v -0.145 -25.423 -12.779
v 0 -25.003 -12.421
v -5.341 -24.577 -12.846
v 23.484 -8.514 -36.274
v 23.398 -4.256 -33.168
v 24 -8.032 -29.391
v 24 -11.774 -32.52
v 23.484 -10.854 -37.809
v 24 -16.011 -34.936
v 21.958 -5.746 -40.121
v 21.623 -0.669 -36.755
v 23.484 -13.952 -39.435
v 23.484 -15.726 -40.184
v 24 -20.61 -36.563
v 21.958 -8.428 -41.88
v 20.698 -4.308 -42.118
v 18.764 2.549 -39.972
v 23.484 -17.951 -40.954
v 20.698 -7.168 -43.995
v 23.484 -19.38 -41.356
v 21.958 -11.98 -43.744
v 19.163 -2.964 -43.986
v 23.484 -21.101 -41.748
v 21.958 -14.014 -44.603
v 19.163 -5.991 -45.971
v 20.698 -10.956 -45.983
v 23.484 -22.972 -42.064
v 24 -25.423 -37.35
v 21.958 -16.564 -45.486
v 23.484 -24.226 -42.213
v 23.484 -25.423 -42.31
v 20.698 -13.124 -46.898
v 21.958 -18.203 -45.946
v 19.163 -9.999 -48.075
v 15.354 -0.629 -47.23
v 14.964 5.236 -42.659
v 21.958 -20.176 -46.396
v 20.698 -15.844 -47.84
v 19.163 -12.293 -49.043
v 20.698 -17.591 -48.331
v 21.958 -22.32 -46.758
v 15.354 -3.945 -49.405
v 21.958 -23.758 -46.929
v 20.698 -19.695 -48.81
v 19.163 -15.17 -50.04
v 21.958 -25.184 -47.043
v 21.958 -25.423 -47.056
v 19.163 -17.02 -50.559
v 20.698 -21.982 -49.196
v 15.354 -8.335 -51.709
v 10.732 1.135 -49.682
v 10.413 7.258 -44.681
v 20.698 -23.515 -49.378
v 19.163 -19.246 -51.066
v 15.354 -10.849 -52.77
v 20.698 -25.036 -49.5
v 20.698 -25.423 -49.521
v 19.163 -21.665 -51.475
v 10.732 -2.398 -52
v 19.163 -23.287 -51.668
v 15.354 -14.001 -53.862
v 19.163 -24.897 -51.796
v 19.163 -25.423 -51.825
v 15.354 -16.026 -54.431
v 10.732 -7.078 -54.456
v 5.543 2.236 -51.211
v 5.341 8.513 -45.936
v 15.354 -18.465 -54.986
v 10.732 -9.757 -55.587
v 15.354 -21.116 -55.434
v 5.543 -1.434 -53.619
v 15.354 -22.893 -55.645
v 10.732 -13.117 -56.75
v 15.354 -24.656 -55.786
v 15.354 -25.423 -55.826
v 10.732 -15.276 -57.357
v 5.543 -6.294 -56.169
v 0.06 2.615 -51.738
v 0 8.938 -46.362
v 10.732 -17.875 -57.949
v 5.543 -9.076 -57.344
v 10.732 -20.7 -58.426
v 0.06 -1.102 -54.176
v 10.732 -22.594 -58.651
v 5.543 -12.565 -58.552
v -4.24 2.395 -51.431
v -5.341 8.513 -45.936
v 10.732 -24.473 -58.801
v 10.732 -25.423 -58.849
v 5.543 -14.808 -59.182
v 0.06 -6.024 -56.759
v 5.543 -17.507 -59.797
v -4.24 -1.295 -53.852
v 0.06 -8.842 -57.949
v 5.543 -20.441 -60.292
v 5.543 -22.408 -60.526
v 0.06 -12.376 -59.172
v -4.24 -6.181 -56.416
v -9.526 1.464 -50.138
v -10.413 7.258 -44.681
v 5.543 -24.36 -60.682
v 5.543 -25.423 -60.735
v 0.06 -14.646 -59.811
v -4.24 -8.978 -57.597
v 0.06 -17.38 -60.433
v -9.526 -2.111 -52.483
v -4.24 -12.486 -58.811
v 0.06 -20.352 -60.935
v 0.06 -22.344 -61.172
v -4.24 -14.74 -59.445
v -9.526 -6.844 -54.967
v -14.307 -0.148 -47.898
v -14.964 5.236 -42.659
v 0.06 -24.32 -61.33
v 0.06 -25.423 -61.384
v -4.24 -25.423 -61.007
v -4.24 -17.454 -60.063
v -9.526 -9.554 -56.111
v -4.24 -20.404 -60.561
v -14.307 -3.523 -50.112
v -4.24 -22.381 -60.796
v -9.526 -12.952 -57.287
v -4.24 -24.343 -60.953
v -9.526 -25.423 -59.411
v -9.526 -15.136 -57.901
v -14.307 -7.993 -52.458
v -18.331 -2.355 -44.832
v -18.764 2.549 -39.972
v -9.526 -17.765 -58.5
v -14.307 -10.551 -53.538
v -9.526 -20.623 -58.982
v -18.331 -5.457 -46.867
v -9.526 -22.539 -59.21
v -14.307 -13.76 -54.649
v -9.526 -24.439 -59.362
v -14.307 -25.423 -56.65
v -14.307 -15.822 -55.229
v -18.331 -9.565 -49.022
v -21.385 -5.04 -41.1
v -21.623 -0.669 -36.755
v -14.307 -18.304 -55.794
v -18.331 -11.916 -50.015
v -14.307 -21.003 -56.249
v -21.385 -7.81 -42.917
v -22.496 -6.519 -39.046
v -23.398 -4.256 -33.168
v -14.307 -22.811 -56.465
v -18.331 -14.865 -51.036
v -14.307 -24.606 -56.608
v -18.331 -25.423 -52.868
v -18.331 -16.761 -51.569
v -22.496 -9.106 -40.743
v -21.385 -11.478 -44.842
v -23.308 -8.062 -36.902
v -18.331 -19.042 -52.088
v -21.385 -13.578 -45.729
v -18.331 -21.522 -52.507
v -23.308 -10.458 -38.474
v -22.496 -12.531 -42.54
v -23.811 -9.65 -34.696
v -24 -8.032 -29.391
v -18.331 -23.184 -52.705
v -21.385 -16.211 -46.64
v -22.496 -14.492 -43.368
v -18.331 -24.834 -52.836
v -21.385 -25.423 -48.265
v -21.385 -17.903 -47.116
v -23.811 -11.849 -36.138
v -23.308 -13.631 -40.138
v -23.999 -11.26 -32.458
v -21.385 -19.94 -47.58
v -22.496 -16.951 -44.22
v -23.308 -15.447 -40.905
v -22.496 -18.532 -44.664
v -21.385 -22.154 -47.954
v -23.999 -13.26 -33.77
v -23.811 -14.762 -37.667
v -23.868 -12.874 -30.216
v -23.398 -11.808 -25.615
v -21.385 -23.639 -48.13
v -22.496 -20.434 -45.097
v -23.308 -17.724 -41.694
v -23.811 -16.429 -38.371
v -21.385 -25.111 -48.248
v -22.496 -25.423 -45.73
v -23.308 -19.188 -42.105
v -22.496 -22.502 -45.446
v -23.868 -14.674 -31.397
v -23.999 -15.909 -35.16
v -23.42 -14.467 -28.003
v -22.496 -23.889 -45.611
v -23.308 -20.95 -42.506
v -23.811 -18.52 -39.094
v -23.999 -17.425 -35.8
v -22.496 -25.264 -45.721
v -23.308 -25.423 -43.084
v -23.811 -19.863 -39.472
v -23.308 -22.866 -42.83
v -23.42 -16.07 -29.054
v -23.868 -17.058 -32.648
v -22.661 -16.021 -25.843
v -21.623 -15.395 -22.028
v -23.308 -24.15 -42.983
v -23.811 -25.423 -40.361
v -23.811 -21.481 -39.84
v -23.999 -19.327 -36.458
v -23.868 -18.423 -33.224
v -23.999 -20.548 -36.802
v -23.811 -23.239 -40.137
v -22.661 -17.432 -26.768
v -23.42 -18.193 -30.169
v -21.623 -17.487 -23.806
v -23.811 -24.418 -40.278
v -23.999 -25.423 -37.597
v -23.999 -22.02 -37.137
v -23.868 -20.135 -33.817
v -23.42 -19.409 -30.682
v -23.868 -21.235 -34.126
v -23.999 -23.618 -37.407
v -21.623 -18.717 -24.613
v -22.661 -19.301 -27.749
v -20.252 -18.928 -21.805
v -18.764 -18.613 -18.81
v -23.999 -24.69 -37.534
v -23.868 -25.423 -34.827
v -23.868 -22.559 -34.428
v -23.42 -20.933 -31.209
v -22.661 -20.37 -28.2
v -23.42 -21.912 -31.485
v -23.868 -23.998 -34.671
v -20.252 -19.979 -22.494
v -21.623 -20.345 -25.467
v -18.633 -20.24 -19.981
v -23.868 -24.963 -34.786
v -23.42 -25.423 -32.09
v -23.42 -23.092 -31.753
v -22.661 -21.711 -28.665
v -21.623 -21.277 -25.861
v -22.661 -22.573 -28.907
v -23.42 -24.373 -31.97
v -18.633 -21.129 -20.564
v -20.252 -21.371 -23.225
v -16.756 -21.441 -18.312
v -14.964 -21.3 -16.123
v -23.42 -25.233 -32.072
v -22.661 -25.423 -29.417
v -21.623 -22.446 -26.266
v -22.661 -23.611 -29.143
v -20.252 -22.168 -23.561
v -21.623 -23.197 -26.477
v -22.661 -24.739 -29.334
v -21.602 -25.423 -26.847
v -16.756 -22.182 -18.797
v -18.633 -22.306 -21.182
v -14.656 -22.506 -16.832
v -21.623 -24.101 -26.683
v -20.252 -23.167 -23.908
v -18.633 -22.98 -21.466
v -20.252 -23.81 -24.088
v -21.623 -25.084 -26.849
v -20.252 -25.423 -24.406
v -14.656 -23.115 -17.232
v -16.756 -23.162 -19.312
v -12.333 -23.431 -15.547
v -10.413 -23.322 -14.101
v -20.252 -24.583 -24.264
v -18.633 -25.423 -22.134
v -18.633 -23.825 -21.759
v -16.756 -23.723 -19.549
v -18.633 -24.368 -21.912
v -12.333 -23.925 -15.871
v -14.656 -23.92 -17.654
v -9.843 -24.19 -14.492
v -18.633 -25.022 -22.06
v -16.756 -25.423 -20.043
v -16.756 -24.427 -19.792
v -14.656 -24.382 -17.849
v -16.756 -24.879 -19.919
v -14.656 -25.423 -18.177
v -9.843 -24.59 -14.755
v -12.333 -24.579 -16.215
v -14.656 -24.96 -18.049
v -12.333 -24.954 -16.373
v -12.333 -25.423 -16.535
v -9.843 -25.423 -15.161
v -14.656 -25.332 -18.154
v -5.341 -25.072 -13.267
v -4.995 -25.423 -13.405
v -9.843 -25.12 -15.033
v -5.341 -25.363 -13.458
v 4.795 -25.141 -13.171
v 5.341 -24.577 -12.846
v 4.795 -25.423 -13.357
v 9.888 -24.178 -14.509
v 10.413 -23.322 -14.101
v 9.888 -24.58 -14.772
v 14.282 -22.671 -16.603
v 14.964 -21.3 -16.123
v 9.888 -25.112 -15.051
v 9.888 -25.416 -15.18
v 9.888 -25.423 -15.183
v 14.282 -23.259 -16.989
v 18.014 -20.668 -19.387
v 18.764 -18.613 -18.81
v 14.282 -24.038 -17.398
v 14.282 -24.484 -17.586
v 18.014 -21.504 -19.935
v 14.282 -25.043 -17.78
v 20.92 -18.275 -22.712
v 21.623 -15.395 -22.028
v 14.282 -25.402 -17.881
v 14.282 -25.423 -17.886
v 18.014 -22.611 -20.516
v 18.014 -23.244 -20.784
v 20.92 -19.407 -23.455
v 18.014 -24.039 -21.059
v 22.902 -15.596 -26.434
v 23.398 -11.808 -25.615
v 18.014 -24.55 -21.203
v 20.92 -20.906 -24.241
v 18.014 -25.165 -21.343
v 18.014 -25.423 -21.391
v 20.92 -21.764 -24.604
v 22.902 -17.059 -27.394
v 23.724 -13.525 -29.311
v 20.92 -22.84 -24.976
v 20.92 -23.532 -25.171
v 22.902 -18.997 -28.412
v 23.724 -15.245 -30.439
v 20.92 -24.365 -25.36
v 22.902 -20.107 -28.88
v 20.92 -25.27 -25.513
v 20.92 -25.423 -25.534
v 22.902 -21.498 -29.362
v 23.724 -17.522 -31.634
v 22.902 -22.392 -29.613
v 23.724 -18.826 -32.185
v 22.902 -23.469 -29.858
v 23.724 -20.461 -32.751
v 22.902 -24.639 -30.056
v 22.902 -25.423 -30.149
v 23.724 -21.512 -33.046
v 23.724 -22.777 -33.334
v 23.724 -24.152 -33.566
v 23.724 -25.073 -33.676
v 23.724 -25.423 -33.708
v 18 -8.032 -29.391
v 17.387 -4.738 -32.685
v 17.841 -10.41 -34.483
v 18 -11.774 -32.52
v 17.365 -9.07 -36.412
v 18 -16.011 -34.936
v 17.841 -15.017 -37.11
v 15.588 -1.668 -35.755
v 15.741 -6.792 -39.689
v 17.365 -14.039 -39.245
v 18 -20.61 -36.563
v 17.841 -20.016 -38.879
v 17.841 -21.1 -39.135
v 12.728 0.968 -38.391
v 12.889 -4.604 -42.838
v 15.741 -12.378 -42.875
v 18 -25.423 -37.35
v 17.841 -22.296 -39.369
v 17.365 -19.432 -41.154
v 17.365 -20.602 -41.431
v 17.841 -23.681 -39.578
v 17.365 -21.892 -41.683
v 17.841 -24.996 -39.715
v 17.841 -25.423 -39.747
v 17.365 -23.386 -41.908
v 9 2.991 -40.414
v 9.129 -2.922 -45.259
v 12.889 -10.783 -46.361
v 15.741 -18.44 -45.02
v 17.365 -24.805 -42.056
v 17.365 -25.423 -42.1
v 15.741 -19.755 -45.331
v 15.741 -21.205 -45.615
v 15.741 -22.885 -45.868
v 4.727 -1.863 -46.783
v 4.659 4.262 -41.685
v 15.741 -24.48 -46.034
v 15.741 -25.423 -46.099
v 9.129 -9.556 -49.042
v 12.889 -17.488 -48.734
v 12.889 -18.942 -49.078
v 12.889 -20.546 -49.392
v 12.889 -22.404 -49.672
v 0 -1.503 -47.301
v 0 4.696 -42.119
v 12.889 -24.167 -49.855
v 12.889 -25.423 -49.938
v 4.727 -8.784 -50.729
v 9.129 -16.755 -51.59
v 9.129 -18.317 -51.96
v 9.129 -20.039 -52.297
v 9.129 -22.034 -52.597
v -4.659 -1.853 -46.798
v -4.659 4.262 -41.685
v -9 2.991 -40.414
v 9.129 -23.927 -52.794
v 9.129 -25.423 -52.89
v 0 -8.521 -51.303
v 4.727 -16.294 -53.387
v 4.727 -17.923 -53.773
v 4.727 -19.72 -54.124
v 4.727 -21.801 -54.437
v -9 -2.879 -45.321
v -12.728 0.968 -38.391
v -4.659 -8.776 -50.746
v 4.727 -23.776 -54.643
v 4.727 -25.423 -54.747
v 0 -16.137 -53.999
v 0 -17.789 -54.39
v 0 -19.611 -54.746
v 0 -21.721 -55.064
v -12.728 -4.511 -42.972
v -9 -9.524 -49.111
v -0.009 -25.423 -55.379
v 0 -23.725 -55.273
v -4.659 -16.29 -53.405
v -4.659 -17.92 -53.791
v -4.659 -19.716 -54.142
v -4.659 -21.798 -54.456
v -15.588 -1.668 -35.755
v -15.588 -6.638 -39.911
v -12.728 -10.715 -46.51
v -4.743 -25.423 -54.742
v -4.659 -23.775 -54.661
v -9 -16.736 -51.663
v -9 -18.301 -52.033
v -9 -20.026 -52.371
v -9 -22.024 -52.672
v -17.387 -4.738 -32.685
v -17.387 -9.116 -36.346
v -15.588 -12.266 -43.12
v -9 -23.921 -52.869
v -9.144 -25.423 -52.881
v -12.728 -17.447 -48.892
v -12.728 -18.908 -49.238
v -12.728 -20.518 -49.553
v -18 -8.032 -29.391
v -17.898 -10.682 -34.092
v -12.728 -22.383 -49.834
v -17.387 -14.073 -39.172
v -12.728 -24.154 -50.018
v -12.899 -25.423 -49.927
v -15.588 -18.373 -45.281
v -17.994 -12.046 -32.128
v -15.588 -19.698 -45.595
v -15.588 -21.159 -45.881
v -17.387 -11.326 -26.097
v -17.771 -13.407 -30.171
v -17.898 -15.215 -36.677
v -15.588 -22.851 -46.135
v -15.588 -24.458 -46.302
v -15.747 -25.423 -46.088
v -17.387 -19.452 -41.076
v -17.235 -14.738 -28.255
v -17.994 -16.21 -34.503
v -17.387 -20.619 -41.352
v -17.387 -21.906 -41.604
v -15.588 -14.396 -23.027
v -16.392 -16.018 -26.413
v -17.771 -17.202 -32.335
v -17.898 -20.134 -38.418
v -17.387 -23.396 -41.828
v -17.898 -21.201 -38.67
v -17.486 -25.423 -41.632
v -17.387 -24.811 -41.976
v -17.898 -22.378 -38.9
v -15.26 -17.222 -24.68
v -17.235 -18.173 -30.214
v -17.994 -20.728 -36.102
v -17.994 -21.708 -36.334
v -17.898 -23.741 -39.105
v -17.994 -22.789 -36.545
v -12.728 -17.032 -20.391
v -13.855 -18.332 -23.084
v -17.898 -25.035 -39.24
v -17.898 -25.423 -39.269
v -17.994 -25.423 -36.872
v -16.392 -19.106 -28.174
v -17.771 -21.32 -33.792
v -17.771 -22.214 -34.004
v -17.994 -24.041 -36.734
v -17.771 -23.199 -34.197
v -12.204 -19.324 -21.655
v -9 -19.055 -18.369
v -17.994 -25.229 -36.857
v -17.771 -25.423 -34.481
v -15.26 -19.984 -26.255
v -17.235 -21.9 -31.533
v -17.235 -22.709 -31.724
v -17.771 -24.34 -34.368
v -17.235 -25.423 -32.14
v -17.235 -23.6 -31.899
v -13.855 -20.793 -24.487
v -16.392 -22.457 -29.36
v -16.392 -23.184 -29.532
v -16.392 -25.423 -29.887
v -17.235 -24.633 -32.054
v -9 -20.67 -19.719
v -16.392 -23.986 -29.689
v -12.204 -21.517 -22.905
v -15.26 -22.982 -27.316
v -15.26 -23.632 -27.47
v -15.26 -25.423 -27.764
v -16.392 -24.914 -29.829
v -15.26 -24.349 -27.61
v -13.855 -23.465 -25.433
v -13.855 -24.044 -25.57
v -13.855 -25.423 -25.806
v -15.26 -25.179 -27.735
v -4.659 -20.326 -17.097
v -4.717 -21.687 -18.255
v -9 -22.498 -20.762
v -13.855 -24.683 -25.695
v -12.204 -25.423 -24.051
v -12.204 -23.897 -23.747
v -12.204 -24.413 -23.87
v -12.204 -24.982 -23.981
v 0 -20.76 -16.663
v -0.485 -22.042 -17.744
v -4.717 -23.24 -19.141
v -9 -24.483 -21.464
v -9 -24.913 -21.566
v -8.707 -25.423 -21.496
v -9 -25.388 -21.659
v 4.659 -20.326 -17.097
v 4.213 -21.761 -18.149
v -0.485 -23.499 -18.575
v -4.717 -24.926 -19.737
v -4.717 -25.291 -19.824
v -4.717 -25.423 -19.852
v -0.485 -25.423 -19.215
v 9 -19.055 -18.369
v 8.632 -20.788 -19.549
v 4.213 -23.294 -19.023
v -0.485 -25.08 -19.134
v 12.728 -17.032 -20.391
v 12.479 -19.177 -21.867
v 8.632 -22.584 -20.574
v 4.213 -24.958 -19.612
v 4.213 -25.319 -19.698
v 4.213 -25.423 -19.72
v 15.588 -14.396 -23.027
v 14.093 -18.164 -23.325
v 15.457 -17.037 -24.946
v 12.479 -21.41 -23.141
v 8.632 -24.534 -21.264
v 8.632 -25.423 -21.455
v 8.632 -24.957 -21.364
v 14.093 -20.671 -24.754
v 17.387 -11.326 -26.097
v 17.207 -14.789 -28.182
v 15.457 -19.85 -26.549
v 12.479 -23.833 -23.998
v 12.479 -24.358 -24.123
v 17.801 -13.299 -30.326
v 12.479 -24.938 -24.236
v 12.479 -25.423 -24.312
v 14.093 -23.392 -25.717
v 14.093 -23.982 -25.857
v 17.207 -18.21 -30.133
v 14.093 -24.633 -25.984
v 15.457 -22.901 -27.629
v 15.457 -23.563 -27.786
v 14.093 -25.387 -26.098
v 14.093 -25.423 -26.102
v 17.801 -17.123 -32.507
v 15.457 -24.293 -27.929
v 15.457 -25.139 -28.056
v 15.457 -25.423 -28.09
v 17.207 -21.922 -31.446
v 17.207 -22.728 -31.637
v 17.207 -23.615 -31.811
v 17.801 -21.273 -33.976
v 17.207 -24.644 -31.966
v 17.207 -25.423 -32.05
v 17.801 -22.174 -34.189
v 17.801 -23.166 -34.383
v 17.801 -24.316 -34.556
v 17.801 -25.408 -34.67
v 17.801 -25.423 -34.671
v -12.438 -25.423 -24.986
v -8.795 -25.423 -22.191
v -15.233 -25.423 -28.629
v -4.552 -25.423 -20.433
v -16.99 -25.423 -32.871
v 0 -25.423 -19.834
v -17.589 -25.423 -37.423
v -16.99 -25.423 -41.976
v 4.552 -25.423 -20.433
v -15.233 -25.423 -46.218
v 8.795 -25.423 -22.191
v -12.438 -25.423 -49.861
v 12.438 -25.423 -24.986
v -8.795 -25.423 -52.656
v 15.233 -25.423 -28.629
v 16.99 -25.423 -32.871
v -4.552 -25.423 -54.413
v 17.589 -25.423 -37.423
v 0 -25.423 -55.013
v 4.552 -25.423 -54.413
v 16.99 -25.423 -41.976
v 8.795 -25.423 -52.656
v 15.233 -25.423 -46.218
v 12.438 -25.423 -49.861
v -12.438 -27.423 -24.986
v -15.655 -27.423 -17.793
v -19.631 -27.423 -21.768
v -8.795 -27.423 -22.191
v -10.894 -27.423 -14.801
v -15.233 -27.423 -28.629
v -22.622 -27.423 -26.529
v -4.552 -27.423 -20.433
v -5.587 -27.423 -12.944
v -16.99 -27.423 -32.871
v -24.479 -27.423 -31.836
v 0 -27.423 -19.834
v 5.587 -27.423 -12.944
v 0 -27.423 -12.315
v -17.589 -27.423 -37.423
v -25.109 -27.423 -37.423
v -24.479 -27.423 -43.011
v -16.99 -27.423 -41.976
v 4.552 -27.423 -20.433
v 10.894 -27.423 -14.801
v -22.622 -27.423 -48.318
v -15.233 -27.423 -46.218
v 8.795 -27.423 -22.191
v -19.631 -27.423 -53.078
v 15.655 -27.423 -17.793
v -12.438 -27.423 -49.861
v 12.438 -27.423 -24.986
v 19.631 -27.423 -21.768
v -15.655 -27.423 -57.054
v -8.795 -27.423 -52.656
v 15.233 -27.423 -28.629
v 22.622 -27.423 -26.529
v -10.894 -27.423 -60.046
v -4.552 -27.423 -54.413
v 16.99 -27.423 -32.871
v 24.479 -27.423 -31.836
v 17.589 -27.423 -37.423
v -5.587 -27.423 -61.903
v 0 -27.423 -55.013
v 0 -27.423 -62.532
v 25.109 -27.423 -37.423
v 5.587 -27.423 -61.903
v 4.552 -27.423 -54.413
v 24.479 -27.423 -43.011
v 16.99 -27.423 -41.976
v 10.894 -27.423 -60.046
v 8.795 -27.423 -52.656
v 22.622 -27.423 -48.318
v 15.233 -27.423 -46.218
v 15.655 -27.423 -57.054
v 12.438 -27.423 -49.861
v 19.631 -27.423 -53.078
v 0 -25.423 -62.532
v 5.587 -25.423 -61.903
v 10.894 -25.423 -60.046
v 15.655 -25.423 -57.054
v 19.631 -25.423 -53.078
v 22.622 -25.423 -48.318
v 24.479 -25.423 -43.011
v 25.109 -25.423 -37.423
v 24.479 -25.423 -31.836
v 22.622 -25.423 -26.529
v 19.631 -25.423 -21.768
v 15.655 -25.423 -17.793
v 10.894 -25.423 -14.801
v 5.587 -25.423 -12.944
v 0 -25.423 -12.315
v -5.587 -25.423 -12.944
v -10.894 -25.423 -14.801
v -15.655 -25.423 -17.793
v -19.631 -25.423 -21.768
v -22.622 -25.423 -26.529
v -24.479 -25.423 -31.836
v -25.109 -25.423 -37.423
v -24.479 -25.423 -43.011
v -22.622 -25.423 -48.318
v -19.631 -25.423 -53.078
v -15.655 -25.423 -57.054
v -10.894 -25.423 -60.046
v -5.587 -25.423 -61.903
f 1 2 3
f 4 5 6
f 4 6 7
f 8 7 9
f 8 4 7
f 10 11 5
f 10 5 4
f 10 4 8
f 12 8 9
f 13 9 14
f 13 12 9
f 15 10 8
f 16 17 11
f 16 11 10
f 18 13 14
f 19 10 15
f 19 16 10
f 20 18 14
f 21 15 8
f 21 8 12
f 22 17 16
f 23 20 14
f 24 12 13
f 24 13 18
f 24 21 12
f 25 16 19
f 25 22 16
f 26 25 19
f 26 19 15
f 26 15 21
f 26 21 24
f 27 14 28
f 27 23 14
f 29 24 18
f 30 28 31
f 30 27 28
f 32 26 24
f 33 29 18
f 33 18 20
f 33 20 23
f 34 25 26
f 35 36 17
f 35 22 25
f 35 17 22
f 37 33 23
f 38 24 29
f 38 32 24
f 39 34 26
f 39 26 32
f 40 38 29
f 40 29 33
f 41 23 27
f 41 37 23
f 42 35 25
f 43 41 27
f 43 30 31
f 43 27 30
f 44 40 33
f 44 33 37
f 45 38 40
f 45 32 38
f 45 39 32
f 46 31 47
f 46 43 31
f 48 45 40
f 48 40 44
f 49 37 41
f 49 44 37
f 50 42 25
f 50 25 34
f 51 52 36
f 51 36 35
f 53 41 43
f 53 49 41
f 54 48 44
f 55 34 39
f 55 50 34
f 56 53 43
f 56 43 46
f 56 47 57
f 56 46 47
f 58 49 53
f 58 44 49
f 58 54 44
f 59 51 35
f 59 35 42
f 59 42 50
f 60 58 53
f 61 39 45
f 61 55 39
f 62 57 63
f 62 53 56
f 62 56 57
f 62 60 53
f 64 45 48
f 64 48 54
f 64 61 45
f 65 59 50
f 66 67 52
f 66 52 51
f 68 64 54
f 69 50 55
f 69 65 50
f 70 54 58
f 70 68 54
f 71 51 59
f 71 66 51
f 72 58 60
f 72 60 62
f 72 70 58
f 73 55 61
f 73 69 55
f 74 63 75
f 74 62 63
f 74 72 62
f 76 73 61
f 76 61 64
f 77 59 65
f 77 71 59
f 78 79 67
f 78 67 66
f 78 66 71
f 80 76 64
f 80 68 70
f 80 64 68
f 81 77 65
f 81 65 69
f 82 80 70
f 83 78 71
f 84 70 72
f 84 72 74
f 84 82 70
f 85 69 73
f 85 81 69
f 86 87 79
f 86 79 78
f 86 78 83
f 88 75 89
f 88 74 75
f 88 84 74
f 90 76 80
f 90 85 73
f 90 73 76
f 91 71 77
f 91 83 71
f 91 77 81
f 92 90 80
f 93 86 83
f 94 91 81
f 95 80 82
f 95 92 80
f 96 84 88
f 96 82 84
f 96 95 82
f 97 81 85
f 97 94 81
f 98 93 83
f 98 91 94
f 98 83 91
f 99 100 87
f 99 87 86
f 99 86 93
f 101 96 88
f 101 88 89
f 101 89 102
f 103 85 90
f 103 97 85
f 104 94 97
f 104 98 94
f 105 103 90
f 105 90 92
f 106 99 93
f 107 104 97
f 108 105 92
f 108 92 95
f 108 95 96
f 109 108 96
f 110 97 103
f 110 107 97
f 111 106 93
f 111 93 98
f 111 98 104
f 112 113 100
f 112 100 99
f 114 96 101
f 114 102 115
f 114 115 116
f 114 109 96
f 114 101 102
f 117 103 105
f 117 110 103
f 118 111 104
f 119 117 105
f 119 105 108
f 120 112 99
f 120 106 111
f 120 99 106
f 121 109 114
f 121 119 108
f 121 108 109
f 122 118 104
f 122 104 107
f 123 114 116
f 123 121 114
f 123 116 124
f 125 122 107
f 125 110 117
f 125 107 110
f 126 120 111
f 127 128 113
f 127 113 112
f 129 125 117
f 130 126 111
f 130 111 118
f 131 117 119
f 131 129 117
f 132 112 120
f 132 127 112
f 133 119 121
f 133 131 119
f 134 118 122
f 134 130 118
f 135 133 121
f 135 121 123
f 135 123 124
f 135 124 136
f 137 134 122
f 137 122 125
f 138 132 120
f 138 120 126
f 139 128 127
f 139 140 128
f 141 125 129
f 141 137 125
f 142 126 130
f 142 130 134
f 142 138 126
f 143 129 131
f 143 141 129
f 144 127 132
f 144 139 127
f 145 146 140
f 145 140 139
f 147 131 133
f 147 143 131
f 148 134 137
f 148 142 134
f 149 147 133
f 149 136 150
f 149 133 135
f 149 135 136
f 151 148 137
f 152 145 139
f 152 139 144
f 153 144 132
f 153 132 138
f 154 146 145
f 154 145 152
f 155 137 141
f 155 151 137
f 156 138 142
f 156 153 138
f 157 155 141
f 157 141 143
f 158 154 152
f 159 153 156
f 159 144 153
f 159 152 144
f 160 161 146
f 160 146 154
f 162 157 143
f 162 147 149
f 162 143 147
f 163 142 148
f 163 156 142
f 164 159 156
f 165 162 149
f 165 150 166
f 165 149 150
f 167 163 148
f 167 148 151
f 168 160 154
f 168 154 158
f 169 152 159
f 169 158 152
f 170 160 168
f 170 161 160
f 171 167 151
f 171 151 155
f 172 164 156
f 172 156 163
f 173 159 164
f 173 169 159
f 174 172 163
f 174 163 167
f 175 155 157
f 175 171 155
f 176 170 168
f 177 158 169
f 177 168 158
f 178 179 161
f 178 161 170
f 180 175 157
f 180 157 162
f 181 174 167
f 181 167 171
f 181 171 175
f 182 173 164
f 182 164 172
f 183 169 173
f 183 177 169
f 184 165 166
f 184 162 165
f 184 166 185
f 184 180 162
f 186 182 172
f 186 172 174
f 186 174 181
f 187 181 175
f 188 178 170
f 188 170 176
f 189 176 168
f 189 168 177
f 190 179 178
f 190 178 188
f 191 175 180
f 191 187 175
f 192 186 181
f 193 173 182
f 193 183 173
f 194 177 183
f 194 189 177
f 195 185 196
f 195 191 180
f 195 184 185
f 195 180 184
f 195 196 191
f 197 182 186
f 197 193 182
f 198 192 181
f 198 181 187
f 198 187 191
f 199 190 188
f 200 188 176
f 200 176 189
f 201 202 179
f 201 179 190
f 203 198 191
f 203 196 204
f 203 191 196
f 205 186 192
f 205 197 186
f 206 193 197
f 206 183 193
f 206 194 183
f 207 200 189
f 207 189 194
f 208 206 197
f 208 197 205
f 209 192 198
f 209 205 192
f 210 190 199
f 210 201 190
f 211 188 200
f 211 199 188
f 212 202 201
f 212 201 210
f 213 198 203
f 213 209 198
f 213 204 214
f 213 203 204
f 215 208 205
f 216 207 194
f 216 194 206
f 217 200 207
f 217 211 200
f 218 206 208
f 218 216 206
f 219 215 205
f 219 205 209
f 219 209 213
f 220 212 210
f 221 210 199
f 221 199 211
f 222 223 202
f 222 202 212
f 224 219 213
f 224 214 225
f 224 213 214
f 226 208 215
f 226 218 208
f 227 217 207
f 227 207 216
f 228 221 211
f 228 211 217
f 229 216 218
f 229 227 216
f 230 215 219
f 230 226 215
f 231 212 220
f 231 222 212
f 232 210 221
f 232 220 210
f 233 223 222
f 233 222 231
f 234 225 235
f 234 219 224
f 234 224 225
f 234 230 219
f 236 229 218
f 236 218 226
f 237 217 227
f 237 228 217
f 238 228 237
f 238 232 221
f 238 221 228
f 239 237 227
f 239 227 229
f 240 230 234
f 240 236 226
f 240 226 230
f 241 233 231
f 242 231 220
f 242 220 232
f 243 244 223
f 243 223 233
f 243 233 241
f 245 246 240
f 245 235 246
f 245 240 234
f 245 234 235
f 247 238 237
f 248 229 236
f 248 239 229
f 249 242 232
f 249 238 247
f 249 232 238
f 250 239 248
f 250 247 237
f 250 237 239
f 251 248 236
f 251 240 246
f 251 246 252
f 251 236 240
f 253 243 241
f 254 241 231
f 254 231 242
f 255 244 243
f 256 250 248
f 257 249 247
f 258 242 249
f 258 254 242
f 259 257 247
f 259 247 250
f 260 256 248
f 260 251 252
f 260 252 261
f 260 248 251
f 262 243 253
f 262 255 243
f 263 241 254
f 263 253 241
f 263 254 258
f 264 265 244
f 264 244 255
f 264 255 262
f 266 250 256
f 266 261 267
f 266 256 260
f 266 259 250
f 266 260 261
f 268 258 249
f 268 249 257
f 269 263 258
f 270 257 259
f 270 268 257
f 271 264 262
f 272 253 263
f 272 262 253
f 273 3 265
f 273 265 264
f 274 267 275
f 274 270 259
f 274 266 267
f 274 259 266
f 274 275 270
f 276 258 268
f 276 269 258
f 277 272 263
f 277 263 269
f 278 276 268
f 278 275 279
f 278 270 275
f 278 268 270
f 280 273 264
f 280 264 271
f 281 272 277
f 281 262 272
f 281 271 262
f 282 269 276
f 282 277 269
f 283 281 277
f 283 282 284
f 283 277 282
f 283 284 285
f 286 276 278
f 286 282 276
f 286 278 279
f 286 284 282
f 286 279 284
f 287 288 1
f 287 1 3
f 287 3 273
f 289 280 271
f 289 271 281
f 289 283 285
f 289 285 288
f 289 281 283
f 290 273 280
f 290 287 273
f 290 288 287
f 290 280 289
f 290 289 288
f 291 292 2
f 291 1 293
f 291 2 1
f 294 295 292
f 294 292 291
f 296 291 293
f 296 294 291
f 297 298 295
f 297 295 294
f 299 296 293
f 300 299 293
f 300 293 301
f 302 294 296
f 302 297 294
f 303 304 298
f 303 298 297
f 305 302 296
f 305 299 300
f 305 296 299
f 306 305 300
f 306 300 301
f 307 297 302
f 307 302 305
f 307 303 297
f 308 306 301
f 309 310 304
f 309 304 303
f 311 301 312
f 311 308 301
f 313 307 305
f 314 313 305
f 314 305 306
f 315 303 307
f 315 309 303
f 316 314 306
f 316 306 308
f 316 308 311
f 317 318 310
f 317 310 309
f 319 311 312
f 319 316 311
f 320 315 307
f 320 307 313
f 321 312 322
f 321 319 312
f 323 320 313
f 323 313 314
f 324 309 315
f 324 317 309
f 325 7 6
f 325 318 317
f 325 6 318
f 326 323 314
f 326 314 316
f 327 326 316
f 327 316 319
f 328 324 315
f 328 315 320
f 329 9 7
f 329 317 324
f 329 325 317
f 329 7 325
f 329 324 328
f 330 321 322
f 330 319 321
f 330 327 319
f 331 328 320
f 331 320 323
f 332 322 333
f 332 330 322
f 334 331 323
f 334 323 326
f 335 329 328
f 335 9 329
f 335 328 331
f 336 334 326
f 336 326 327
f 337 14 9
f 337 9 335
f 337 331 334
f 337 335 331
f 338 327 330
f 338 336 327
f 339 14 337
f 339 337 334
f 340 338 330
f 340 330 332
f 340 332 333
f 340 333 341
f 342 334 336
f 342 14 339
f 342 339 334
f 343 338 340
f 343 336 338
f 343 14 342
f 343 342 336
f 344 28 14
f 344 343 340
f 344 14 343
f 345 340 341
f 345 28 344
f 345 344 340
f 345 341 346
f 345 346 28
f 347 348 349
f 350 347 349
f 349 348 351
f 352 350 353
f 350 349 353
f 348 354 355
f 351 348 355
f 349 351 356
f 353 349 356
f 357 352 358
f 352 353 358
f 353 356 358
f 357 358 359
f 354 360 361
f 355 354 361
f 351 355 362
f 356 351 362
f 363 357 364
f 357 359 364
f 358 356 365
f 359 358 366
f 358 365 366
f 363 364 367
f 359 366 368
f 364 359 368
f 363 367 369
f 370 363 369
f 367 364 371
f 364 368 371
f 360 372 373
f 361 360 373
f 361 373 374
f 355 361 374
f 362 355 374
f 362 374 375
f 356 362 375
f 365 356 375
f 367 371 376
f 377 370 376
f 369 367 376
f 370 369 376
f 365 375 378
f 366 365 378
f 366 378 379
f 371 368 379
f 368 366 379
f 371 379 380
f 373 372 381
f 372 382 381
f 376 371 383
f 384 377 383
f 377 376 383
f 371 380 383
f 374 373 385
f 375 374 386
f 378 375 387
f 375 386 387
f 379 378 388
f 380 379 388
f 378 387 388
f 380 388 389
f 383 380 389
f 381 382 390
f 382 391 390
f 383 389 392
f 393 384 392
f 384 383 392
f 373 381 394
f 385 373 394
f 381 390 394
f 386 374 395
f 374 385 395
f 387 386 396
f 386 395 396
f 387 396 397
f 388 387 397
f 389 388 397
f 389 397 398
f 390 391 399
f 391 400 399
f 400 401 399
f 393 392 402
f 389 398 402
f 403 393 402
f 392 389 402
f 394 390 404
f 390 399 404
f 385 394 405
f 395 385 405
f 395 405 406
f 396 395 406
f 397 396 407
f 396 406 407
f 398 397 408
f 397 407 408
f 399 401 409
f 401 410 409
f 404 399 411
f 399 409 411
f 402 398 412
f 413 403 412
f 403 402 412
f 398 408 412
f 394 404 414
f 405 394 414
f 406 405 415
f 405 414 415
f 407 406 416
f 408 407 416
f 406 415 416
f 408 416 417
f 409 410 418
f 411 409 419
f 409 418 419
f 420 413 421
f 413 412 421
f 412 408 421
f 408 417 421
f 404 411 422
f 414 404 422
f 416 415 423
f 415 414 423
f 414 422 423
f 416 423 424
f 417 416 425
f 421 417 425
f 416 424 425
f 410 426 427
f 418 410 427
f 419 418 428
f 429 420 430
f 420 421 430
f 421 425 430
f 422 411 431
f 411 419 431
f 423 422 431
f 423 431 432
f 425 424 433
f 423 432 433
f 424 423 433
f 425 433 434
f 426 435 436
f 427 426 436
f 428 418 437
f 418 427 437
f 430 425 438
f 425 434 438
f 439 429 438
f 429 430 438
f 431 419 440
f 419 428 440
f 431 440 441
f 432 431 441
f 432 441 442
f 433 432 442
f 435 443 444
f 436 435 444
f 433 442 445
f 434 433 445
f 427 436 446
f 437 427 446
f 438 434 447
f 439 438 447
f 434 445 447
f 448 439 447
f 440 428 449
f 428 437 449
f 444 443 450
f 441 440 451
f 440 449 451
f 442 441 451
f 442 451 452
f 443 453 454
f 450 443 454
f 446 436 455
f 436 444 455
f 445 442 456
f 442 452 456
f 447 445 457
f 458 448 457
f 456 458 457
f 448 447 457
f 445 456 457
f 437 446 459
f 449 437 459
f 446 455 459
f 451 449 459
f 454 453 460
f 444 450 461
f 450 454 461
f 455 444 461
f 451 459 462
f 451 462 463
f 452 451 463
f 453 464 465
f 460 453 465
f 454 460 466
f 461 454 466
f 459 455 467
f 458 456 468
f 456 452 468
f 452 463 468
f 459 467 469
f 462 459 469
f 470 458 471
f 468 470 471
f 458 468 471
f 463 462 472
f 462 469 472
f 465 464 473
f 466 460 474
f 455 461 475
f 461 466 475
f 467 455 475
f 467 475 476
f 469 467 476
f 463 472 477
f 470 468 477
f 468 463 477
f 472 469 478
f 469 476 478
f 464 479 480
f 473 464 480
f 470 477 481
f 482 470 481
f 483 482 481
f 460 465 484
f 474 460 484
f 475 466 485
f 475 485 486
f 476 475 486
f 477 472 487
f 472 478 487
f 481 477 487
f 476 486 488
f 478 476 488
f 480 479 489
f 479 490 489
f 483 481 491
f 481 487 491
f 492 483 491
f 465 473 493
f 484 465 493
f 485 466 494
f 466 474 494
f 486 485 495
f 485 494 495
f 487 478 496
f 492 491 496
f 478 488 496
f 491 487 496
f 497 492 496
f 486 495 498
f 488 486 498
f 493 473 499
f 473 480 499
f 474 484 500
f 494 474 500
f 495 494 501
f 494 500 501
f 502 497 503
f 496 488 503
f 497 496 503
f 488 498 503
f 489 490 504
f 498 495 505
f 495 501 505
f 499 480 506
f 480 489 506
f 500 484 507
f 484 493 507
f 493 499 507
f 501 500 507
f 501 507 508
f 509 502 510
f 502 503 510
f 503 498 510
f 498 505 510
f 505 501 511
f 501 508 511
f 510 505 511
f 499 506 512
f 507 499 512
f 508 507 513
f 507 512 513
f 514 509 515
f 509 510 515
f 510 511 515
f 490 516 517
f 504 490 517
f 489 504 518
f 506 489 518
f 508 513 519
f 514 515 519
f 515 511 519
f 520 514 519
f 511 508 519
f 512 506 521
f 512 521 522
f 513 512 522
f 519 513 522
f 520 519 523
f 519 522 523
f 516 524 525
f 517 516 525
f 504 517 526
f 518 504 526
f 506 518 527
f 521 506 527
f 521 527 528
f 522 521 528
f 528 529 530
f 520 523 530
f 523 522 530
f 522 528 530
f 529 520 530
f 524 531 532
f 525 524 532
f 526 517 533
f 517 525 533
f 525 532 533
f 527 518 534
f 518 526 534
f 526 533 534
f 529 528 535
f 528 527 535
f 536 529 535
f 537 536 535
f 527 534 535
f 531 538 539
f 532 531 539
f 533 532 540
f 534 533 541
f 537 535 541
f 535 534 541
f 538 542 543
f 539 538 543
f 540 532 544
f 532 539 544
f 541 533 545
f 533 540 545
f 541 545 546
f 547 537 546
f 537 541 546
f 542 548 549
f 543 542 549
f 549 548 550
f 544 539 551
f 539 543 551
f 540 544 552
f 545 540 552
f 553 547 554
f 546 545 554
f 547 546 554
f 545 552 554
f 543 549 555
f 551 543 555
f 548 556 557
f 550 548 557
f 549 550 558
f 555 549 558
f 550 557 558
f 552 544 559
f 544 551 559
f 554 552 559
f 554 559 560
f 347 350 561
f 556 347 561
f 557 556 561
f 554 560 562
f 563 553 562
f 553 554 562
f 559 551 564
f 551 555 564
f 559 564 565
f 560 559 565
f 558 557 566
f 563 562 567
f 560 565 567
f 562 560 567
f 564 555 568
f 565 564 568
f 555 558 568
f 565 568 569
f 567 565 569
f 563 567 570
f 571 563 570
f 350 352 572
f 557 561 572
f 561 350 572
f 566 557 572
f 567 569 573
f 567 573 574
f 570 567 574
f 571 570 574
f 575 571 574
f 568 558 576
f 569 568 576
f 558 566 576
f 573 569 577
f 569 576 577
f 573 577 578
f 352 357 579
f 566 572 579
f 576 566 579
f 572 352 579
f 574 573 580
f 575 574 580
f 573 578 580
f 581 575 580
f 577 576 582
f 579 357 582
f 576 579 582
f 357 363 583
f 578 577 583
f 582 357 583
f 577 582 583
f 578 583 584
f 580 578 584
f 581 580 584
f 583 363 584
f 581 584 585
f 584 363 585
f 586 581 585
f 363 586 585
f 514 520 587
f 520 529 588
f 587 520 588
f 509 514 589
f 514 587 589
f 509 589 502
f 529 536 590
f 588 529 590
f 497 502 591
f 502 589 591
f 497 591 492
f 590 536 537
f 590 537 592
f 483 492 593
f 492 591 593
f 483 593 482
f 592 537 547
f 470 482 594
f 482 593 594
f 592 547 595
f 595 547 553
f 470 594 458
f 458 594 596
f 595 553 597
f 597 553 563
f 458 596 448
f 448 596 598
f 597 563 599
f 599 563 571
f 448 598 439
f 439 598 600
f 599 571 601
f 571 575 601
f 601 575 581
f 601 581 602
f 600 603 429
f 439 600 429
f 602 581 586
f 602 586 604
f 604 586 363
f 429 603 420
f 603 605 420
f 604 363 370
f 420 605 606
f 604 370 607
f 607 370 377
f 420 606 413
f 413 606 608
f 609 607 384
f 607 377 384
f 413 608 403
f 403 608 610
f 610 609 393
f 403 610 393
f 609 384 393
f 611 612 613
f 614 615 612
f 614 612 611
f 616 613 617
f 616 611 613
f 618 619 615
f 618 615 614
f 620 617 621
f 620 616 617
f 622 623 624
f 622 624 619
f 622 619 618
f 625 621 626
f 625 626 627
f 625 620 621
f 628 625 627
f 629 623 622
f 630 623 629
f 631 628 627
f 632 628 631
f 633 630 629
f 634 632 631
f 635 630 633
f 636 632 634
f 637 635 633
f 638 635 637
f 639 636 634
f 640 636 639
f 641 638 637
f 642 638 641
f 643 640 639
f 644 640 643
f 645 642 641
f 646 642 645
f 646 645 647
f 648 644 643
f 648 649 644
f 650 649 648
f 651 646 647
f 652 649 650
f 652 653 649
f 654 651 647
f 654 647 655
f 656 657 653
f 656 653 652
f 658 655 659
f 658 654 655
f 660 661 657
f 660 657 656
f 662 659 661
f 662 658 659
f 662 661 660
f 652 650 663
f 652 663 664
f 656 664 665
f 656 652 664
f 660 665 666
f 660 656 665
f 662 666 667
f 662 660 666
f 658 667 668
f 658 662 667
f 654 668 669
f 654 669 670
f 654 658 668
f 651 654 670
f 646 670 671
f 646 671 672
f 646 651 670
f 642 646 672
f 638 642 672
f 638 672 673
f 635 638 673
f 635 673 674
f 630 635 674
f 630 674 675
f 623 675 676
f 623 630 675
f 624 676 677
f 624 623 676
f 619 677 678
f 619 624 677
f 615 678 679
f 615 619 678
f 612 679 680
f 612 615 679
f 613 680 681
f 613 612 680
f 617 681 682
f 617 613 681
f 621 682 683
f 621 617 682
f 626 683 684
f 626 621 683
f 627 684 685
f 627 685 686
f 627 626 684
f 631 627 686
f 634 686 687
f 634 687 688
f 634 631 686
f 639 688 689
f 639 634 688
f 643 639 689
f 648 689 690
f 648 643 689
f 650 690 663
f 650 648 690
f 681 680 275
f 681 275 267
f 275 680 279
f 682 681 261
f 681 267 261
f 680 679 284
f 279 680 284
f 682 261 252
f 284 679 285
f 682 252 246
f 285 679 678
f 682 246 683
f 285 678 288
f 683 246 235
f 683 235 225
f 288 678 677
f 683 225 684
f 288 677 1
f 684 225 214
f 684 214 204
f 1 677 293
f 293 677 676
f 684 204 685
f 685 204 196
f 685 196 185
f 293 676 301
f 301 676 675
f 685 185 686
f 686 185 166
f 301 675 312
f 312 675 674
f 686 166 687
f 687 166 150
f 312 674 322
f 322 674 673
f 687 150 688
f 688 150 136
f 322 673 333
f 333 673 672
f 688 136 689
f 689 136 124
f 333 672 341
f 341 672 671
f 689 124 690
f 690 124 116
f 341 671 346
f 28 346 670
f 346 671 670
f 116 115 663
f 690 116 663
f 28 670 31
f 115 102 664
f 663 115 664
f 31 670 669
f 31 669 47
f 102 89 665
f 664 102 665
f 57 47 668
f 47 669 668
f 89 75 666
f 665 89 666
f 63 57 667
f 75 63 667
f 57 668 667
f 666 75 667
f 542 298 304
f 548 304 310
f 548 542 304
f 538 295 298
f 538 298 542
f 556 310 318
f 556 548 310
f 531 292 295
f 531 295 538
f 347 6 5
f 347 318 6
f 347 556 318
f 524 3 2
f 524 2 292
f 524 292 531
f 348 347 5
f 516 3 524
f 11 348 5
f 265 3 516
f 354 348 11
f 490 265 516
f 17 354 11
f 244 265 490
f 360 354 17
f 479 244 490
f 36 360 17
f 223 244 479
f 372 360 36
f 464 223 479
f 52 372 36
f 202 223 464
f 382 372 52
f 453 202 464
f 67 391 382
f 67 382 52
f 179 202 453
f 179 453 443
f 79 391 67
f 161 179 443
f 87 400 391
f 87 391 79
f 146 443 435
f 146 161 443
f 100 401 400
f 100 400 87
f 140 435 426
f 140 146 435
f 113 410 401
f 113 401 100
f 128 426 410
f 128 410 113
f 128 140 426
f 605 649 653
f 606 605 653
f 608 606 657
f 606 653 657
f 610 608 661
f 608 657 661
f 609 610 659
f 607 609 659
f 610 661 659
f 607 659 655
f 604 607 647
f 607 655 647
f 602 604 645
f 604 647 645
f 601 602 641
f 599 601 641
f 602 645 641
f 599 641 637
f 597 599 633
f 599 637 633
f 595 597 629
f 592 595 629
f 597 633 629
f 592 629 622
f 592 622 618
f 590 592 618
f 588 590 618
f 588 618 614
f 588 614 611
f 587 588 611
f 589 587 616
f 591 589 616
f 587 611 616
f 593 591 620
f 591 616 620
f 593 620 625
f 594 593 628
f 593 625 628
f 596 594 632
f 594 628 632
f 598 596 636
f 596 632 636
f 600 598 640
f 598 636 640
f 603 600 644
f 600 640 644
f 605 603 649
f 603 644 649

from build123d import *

# Parameters (mm, degrees)
SKETCH1_R               = 24
SKETCH1_R_2             = 18
CUT_EXTRUDE1_DEPTH      = 75.38952556
CUT_EXTRUDE1_DEPTH_BACK = 75.38952556
SKETCH4_R               = 25.108714005
SKETCH4_R_2             = 17.589295803
BOSS_EXTRUDE2_DEPTH     = 2


with BuildPart() as part:
    # Sweep1: sweep along a path in Sketch2
    with BuildLine(Plane(origin=(0, 0, 0), x_dir=(0, 0, -1), z_dir=(1, 0, 0))) as sweep1_path:
        Line((0, 0), (10, 0))
        ThreePointArc((10, 0), (29.391260893, -8.032123253), (37.423384146, -27.423384146))
        Line((37.423384146, -27.423384146), (37.423384146, -34.423384146))
    # Sketch1 → Sweep1 (sweep)
    with BuildSketch(Plane.XY):
        Circle(SKETCH1_R)
        Circle(SKETCH1_R_2, mode=Mode.SUBTRACT)
    sweep(path=sweep1_path.line)

    # Sketch3 → Cut-Extrude1 (cut, two sides: drawn at the far end of the back side and taken through both)
    with BuildSketch(Plane(origin=(0, 0, 0), x_dir=(0, 0, -1), z_dir=(1, 0, 0)).offset(-CUT_EXTRUDE1_DEPTH_BACK)):
        Polygon((-2.958156398, 64.756445855), (-4.559022853, -41.982406999), (10, -27.423384146), (49.610836801, 12.187452656), align=None)
        Polygon((82.756453971, -43.291962181), (-4.559022853, -41.982406999), (10, -27.423384146), (61.423384146, -27.423384146), (82.756453971, -20.958164514), align=None)
    extrude(amount=CUT_EXTRUDE1_DEPTH + CUT_EXTRUDE1_DEPTH_BACK, mode=Mode.SUBTRACT)

    # Sketch4 → Boss-Extrude2 (add)
    with BuildSketch(Plane(origin=(0, -27.423384146, 0), x_dir=(-1, 0, 0), z_dir=(0, -1, 0))):
        with Locations(Location((0, 37.423384146, 0), (0, 0, 90))):
            Circle(SKETCH4_R)
        with Locations(Location((0, 37.423384146, 0), (0, 0, 90))):
            Circle(SKETCH4_R_2, mode=Mode.SUBTRACT)
    extrude(amount=-BOSS_EXTRUDE2_DEPTH)


solid = part.part
